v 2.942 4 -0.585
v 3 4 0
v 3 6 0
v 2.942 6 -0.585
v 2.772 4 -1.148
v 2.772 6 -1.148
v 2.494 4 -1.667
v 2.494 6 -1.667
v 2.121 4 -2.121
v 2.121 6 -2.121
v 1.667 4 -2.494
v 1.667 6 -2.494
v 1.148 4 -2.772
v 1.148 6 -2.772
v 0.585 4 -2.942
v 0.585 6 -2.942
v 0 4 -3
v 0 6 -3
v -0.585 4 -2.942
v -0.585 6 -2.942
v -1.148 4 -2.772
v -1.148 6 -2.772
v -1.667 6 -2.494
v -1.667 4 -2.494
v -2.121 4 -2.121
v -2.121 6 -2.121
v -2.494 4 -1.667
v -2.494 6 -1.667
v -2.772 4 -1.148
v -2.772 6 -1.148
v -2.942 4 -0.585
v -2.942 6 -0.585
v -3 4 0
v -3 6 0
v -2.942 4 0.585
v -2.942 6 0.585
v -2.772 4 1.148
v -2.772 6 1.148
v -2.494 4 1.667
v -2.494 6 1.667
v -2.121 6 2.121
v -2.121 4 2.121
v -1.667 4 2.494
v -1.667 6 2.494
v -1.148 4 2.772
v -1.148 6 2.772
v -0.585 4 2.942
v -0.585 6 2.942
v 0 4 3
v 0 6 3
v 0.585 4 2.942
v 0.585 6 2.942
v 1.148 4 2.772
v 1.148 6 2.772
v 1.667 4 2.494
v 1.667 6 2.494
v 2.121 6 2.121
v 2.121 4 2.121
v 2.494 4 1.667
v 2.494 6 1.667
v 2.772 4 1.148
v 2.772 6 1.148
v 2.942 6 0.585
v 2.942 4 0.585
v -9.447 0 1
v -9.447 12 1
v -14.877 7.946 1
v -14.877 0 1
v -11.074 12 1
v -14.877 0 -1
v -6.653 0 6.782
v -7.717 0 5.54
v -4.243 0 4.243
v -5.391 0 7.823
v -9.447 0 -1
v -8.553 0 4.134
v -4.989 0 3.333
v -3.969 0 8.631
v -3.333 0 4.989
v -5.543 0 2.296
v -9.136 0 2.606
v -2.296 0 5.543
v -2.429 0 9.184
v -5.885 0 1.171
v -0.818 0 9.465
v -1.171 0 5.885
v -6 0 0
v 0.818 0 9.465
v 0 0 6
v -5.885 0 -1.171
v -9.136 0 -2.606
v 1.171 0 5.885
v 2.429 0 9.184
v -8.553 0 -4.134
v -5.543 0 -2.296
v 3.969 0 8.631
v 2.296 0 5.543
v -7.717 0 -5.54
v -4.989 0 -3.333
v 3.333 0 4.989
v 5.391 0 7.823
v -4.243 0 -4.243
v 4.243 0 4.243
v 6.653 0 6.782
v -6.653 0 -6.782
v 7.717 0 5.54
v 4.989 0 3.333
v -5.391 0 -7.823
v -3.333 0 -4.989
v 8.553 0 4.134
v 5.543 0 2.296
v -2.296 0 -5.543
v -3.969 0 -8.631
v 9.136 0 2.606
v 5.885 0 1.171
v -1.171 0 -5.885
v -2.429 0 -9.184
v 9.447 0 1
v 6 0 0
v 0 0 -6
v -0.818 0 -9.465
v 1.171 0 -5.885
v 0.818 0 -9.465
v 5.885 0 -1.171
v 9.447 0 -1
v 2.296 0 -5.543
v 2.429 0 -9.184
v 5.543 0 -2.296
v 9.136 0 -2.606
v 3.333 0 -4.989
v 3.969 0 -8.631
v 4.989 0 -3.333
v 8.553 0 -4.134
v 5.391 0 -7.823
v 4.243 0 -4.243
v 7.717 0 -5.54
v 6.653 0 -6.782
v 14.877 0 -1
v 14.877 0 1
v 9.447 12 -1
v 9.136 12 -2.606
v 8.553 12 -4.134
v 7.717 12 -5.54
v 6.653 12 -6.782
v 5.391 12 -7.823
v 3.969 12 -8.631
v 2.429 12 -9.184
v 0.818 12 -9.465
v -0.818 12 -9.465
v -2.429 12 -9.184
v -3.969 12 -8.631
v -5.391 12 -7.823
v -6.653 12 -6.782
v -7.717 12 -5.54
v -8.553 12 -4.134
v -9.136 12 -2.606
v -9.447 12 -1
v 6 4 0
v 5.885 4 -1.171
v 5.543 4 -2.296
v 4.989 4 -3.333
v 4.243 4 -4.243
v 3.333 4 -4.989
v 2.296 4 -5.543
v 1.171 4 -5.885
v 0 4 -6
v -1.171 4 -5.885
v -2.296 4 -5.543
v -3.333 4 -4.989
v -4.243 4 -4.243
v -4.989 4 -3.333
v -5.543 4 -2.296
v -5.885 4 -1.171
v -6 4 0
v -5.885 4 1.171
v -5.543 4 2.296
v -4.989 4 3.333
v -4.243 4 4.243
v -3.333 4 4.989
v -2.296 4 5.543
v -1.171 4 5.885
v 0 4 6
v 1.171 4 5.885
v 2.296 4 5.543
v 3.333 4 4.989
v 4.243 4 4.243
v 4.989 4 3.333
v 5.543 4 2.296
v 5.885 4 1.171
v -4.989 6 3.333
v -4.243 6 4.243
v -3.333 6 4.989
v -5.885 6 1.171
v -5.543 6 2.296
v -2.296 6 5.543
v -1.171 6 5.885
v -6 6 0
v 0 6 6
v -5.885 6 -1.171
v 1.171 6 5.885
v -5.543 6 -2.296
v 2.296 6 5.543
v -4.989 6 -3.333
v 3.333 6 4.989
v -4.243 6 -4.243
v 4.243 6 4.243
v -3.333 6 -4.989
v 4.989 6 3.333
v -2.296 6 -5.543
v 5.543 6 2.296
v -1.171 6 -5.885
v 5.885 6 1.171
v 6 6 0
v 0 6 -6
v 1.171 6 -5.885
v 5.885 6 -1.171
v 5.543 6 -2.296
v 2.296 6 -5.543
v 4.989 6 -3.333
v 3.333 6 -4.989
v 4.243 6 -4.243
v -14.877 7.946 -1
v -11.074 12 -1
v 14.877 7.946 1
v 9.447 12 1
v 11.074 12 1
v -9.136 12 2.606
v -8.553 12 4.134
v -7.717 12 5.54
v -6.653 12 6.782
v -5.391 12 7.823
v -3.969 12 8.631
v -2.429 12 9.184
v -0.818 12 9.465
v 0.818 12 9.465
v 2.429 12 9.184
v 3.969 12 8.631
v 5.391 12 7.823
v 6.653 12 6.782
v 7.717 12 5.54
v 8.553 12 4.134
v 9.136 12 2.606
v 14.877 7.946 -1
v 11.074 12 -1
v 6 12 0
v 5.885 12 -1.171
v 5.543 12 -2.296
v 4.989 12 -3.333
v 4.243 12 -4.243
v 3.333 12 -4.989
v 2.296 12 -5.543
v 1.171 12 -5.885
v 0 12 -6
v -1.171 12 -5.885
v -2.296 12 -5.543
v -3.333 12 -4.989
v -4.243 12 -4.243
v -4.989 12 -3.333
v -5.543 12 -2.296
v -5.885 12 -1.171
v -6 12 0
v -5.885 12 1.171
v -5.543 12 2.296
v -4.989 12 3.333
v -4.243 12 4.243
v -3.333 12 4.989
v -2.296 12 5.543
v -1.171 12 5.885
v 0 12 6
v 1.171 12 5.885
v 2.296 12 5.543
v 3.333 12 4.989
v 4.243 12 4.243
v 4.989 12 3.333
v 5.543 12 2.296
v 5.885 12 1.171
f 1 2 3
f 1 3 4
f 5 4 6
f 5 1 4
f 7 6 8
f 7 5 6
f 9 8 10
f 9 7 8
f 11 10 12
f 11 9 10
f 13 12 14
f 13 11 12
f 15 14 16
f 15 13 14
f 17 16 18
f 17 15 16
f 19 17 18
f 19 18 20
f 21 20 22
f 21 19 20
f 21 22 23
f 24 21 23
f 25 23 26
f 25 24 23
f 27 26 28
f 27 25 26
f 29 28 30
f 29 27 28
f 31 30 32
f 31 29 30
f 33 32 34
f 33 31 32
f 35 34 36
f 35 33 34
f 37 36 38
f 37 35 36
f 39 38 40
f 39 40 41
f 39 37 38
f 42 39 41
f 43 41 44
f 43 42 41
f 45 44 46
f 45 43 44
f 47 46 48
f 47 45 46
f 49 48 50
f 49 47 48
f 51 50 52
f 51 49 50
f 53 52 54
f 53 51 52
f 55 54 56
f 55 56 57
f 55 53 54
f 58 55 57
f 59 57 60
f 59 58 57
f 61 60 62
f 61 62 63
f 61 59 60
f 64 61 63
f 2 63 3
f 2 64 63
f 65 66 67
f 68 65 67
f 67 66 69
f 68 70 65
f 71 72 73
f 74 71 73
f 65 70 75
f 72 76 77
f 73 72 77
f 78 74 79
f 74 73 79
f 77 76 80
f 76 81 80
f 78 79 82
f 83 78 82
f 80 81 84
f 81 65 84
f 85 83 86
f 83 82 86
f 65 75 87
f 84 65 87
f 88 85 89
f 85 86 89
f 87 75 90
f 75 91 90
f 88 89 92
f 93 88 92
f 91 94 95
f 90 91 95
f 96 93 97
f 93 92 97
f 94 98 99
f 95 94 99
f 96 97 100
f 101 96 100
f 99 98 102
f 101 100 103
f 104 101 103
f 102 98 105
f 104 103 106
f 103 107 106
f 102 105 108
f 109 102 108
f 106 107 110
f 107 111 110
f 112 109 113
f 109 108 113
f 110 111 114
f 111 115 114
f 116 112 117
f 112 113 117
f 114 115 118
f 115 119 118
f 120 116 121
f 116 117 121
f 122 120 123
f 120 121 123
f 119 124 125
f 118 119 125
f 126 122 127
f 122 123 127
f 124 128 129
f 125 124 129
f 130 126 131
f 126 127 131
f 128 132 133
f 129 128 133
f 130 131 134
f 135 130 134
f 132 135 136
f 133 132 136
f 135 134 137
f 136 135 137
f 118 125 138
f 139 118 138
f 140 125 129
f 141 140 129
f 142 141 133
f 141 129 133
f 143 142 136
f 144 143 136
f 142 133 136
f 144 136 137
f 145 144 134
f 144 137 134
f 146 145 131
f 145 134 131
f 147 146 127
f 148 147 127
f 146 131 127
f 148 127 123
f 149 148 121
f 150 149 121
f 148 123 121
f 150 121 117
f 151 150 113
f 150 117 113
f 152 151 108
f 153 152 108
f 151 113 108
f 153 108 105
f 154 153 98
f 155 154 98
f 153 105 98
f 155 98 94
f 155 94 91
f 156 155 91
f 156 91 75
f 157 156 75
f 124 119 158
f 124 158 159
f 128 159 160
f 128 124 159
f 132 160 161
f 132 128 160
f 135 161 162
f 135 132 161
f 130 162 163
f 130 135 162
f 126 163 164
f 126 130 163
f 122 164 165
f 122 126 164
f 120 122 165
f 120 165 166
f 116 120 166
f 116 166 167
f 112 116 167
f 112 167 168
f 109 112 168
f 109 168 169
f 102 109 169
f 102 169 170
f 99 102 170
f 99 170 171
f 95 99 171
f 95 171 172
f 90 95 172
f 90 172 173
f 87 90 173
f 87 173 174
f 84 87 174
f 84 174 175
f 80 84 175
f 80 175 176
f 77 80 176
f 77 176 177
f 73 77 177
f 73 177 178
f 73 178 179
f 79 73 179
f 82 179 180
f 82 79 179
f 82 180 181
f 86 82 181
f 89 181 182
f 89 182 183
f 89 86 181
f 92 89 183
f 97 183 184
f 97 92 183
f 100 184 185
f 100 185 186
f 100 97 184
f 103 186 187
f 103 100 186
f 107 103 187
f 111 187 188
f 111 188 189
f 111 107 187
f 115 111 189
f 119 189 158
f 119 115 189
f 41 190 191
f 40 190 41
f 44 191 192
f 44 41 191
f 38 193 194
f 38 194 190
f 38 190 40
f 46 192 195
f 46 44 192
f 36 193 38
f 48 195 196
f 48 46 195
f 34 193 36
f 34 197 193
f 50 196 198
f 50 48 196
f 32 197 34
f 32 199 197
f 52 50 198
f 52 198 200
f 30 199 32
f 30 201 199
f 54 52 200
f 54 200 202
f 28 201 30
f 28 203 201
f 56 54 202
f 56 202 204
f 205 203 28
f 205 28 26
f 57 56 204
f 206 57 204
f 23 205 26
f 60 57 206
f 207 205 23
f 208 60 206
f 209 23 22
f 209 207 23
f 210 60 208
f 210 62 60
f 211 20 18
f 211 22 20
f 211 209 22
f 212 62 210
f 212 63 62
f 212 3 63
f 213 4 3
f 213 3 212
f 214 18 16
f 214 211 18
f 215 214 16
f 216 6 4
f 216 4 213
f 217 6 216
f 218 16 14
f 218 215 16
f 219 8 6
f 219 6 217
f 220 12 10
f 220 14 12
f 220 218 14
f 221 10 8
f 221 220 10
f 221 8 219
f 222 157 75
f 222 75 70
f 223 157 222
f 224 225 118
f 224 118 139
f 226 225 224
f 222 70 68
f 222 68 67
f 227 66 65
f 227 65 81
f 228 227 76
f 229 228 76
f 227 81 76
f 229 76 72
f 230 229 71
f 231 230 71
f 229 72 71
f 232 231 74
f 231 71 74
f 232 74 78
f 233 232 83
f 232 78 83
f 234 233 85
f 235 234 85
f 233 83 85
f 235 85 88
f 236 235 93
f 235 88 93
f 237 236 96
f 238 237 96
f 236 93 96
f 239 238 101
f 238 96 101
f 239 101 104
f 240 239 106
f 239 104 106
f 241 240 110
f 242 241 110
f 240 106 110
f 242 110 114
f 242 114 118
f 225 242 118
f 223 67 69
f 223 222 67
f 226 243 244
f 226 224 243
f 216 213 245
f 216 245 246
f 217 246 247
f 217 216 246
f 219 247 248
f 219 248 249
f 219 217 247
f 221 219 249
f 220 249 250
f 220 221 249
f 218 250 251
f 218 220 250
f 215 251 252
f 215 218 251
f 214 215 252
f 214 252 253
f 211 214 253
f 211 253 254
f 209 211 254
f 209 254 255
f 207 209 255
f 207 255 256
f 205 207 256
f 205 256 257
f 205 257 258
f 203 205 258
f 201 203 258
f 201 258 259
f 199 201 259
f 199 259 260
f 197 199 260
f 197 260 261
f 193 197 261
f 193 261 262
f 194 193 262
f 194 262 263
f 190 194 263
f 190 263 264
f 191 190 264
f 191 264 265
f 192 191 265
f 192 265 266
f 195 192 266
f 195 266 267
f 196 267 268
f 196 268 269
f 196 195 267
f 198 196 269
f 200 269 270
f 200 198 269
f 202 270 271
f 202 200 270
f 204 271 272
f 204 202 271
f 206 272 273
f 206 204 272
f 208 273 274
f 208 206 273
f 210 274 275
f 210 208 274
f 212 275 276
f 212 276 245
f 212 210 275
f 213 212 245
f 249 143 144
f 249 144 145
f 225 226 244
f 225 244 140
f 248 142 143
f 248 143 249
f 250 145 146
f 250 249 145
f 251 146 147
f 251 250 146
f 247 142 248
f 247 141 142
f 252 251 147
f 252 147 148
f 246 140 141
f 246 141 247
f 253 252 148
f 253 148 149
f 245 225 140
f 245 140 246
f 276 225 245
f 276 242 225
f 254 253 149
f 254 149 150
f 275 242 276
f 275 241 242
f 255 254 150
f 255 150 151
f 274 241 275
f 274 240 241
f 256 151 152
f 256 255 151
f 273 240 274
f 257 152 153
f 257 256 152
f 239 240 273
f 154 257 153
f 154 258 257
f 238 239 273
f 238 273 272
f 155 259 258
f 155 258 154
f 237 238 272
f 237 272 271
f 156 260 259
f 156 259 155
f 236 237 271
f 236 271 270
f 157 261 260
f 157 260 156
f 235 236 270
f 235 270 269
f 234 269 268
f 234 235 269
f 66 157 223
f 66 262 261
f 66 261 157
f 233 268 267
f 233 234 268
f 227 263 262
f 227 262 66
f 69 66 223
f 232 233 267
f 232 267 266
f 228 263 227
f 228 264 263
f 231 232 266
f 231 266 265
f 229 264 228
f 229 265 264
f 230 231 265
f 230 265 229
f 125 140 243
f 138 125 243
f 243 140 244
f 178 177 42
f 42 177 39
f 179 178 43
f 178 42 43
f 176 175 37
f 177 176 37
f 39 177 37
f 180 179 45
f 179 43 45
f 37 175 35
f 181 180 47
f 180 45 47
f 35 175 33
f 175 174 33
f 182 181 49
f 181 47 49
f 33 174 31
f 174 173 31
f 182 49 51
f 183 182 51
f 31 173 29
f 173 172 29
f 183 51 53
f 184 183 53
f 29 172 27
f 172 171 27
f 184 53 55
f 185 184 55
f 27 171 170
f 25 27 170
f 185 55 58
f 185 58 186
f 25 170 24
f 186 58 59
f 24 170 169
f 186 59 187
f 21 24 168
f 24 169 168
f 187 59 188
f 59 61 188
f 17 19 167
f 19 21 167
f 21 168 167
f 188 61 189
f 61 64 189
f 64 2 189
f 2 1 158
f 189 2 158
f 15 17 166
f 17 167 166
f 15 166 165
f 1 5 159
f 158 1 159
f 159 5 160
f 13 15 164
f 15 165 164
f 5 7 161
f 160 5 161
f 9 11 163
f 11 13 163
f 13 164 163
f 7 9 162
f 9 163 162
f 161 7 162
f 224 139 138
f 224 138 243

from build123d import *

# Parameters (mm, degrees)
SKETCH1_R           = 9.5
SKETCH1_R_2         = 6
BOSS_EXTRUDE1_DEPTH = 12
BOSS_EXTRUDE2_DEPTH = 1
CIRPATTERN1_COUNT   = 2
SKETCH3_R           = 6
SKETCH3_R_2         = 3
BOSS_EXTRUDE3_DEPTH = 2


with BuildPart() as part:
    # Sketch1 → Boss-Extrude1 (new body)
    with BuildSketch(Plane(origin=(0, 0, 0), x_dir=(1, 0, 0), z_dir=(0, 1, 0))):
        Circle(SKETCH1_R)
        Circle(SKETCH1_R_2, mode=Mode.SUBTRACT)
    extrude(amount=BOSS_EXTRUDE1_DEPTH)

    # Sketch2 → Boss-Extrude2 (add, symmetric)
    with BuildSketch(Plane.XY):
        Polygon((7.271324846, 12), (7.271324846, 0), (14.87673759, 0), (14.87673759, 7.945570702), (11.074031218, 12), align=None)
    boss_extrude2 = extrude(amount=BOSS_EXTRUDE2_DEPTH, both=True)

    # CirPattern1: Boss-Extrude2 ×2 about axis
    cirpattern1_axis = Axis((0, 12, 0), (0, -1, 0))
    for i in range(1, CIRPATTERN1_COUNT):
        add(boss_extrude2.rotate(cirpattern1_axis, i * 360 / CIRPATTERN1_COUNT))

    # Sketch3 → Boss-Extrude3 (add)
    with BuildSketch(Plane(origin=(0, 4, 0), x_dir=(1, 0, 0), z_dir=(0, 1, 0))):
        Circle(SKETCH3_R)
        Circle(SKETCH3_R_2, mode=Mode.SUBTRACT)
    extrude(amount=BOSS_EXTRUDE3_DEPTH)


solid = part.part
